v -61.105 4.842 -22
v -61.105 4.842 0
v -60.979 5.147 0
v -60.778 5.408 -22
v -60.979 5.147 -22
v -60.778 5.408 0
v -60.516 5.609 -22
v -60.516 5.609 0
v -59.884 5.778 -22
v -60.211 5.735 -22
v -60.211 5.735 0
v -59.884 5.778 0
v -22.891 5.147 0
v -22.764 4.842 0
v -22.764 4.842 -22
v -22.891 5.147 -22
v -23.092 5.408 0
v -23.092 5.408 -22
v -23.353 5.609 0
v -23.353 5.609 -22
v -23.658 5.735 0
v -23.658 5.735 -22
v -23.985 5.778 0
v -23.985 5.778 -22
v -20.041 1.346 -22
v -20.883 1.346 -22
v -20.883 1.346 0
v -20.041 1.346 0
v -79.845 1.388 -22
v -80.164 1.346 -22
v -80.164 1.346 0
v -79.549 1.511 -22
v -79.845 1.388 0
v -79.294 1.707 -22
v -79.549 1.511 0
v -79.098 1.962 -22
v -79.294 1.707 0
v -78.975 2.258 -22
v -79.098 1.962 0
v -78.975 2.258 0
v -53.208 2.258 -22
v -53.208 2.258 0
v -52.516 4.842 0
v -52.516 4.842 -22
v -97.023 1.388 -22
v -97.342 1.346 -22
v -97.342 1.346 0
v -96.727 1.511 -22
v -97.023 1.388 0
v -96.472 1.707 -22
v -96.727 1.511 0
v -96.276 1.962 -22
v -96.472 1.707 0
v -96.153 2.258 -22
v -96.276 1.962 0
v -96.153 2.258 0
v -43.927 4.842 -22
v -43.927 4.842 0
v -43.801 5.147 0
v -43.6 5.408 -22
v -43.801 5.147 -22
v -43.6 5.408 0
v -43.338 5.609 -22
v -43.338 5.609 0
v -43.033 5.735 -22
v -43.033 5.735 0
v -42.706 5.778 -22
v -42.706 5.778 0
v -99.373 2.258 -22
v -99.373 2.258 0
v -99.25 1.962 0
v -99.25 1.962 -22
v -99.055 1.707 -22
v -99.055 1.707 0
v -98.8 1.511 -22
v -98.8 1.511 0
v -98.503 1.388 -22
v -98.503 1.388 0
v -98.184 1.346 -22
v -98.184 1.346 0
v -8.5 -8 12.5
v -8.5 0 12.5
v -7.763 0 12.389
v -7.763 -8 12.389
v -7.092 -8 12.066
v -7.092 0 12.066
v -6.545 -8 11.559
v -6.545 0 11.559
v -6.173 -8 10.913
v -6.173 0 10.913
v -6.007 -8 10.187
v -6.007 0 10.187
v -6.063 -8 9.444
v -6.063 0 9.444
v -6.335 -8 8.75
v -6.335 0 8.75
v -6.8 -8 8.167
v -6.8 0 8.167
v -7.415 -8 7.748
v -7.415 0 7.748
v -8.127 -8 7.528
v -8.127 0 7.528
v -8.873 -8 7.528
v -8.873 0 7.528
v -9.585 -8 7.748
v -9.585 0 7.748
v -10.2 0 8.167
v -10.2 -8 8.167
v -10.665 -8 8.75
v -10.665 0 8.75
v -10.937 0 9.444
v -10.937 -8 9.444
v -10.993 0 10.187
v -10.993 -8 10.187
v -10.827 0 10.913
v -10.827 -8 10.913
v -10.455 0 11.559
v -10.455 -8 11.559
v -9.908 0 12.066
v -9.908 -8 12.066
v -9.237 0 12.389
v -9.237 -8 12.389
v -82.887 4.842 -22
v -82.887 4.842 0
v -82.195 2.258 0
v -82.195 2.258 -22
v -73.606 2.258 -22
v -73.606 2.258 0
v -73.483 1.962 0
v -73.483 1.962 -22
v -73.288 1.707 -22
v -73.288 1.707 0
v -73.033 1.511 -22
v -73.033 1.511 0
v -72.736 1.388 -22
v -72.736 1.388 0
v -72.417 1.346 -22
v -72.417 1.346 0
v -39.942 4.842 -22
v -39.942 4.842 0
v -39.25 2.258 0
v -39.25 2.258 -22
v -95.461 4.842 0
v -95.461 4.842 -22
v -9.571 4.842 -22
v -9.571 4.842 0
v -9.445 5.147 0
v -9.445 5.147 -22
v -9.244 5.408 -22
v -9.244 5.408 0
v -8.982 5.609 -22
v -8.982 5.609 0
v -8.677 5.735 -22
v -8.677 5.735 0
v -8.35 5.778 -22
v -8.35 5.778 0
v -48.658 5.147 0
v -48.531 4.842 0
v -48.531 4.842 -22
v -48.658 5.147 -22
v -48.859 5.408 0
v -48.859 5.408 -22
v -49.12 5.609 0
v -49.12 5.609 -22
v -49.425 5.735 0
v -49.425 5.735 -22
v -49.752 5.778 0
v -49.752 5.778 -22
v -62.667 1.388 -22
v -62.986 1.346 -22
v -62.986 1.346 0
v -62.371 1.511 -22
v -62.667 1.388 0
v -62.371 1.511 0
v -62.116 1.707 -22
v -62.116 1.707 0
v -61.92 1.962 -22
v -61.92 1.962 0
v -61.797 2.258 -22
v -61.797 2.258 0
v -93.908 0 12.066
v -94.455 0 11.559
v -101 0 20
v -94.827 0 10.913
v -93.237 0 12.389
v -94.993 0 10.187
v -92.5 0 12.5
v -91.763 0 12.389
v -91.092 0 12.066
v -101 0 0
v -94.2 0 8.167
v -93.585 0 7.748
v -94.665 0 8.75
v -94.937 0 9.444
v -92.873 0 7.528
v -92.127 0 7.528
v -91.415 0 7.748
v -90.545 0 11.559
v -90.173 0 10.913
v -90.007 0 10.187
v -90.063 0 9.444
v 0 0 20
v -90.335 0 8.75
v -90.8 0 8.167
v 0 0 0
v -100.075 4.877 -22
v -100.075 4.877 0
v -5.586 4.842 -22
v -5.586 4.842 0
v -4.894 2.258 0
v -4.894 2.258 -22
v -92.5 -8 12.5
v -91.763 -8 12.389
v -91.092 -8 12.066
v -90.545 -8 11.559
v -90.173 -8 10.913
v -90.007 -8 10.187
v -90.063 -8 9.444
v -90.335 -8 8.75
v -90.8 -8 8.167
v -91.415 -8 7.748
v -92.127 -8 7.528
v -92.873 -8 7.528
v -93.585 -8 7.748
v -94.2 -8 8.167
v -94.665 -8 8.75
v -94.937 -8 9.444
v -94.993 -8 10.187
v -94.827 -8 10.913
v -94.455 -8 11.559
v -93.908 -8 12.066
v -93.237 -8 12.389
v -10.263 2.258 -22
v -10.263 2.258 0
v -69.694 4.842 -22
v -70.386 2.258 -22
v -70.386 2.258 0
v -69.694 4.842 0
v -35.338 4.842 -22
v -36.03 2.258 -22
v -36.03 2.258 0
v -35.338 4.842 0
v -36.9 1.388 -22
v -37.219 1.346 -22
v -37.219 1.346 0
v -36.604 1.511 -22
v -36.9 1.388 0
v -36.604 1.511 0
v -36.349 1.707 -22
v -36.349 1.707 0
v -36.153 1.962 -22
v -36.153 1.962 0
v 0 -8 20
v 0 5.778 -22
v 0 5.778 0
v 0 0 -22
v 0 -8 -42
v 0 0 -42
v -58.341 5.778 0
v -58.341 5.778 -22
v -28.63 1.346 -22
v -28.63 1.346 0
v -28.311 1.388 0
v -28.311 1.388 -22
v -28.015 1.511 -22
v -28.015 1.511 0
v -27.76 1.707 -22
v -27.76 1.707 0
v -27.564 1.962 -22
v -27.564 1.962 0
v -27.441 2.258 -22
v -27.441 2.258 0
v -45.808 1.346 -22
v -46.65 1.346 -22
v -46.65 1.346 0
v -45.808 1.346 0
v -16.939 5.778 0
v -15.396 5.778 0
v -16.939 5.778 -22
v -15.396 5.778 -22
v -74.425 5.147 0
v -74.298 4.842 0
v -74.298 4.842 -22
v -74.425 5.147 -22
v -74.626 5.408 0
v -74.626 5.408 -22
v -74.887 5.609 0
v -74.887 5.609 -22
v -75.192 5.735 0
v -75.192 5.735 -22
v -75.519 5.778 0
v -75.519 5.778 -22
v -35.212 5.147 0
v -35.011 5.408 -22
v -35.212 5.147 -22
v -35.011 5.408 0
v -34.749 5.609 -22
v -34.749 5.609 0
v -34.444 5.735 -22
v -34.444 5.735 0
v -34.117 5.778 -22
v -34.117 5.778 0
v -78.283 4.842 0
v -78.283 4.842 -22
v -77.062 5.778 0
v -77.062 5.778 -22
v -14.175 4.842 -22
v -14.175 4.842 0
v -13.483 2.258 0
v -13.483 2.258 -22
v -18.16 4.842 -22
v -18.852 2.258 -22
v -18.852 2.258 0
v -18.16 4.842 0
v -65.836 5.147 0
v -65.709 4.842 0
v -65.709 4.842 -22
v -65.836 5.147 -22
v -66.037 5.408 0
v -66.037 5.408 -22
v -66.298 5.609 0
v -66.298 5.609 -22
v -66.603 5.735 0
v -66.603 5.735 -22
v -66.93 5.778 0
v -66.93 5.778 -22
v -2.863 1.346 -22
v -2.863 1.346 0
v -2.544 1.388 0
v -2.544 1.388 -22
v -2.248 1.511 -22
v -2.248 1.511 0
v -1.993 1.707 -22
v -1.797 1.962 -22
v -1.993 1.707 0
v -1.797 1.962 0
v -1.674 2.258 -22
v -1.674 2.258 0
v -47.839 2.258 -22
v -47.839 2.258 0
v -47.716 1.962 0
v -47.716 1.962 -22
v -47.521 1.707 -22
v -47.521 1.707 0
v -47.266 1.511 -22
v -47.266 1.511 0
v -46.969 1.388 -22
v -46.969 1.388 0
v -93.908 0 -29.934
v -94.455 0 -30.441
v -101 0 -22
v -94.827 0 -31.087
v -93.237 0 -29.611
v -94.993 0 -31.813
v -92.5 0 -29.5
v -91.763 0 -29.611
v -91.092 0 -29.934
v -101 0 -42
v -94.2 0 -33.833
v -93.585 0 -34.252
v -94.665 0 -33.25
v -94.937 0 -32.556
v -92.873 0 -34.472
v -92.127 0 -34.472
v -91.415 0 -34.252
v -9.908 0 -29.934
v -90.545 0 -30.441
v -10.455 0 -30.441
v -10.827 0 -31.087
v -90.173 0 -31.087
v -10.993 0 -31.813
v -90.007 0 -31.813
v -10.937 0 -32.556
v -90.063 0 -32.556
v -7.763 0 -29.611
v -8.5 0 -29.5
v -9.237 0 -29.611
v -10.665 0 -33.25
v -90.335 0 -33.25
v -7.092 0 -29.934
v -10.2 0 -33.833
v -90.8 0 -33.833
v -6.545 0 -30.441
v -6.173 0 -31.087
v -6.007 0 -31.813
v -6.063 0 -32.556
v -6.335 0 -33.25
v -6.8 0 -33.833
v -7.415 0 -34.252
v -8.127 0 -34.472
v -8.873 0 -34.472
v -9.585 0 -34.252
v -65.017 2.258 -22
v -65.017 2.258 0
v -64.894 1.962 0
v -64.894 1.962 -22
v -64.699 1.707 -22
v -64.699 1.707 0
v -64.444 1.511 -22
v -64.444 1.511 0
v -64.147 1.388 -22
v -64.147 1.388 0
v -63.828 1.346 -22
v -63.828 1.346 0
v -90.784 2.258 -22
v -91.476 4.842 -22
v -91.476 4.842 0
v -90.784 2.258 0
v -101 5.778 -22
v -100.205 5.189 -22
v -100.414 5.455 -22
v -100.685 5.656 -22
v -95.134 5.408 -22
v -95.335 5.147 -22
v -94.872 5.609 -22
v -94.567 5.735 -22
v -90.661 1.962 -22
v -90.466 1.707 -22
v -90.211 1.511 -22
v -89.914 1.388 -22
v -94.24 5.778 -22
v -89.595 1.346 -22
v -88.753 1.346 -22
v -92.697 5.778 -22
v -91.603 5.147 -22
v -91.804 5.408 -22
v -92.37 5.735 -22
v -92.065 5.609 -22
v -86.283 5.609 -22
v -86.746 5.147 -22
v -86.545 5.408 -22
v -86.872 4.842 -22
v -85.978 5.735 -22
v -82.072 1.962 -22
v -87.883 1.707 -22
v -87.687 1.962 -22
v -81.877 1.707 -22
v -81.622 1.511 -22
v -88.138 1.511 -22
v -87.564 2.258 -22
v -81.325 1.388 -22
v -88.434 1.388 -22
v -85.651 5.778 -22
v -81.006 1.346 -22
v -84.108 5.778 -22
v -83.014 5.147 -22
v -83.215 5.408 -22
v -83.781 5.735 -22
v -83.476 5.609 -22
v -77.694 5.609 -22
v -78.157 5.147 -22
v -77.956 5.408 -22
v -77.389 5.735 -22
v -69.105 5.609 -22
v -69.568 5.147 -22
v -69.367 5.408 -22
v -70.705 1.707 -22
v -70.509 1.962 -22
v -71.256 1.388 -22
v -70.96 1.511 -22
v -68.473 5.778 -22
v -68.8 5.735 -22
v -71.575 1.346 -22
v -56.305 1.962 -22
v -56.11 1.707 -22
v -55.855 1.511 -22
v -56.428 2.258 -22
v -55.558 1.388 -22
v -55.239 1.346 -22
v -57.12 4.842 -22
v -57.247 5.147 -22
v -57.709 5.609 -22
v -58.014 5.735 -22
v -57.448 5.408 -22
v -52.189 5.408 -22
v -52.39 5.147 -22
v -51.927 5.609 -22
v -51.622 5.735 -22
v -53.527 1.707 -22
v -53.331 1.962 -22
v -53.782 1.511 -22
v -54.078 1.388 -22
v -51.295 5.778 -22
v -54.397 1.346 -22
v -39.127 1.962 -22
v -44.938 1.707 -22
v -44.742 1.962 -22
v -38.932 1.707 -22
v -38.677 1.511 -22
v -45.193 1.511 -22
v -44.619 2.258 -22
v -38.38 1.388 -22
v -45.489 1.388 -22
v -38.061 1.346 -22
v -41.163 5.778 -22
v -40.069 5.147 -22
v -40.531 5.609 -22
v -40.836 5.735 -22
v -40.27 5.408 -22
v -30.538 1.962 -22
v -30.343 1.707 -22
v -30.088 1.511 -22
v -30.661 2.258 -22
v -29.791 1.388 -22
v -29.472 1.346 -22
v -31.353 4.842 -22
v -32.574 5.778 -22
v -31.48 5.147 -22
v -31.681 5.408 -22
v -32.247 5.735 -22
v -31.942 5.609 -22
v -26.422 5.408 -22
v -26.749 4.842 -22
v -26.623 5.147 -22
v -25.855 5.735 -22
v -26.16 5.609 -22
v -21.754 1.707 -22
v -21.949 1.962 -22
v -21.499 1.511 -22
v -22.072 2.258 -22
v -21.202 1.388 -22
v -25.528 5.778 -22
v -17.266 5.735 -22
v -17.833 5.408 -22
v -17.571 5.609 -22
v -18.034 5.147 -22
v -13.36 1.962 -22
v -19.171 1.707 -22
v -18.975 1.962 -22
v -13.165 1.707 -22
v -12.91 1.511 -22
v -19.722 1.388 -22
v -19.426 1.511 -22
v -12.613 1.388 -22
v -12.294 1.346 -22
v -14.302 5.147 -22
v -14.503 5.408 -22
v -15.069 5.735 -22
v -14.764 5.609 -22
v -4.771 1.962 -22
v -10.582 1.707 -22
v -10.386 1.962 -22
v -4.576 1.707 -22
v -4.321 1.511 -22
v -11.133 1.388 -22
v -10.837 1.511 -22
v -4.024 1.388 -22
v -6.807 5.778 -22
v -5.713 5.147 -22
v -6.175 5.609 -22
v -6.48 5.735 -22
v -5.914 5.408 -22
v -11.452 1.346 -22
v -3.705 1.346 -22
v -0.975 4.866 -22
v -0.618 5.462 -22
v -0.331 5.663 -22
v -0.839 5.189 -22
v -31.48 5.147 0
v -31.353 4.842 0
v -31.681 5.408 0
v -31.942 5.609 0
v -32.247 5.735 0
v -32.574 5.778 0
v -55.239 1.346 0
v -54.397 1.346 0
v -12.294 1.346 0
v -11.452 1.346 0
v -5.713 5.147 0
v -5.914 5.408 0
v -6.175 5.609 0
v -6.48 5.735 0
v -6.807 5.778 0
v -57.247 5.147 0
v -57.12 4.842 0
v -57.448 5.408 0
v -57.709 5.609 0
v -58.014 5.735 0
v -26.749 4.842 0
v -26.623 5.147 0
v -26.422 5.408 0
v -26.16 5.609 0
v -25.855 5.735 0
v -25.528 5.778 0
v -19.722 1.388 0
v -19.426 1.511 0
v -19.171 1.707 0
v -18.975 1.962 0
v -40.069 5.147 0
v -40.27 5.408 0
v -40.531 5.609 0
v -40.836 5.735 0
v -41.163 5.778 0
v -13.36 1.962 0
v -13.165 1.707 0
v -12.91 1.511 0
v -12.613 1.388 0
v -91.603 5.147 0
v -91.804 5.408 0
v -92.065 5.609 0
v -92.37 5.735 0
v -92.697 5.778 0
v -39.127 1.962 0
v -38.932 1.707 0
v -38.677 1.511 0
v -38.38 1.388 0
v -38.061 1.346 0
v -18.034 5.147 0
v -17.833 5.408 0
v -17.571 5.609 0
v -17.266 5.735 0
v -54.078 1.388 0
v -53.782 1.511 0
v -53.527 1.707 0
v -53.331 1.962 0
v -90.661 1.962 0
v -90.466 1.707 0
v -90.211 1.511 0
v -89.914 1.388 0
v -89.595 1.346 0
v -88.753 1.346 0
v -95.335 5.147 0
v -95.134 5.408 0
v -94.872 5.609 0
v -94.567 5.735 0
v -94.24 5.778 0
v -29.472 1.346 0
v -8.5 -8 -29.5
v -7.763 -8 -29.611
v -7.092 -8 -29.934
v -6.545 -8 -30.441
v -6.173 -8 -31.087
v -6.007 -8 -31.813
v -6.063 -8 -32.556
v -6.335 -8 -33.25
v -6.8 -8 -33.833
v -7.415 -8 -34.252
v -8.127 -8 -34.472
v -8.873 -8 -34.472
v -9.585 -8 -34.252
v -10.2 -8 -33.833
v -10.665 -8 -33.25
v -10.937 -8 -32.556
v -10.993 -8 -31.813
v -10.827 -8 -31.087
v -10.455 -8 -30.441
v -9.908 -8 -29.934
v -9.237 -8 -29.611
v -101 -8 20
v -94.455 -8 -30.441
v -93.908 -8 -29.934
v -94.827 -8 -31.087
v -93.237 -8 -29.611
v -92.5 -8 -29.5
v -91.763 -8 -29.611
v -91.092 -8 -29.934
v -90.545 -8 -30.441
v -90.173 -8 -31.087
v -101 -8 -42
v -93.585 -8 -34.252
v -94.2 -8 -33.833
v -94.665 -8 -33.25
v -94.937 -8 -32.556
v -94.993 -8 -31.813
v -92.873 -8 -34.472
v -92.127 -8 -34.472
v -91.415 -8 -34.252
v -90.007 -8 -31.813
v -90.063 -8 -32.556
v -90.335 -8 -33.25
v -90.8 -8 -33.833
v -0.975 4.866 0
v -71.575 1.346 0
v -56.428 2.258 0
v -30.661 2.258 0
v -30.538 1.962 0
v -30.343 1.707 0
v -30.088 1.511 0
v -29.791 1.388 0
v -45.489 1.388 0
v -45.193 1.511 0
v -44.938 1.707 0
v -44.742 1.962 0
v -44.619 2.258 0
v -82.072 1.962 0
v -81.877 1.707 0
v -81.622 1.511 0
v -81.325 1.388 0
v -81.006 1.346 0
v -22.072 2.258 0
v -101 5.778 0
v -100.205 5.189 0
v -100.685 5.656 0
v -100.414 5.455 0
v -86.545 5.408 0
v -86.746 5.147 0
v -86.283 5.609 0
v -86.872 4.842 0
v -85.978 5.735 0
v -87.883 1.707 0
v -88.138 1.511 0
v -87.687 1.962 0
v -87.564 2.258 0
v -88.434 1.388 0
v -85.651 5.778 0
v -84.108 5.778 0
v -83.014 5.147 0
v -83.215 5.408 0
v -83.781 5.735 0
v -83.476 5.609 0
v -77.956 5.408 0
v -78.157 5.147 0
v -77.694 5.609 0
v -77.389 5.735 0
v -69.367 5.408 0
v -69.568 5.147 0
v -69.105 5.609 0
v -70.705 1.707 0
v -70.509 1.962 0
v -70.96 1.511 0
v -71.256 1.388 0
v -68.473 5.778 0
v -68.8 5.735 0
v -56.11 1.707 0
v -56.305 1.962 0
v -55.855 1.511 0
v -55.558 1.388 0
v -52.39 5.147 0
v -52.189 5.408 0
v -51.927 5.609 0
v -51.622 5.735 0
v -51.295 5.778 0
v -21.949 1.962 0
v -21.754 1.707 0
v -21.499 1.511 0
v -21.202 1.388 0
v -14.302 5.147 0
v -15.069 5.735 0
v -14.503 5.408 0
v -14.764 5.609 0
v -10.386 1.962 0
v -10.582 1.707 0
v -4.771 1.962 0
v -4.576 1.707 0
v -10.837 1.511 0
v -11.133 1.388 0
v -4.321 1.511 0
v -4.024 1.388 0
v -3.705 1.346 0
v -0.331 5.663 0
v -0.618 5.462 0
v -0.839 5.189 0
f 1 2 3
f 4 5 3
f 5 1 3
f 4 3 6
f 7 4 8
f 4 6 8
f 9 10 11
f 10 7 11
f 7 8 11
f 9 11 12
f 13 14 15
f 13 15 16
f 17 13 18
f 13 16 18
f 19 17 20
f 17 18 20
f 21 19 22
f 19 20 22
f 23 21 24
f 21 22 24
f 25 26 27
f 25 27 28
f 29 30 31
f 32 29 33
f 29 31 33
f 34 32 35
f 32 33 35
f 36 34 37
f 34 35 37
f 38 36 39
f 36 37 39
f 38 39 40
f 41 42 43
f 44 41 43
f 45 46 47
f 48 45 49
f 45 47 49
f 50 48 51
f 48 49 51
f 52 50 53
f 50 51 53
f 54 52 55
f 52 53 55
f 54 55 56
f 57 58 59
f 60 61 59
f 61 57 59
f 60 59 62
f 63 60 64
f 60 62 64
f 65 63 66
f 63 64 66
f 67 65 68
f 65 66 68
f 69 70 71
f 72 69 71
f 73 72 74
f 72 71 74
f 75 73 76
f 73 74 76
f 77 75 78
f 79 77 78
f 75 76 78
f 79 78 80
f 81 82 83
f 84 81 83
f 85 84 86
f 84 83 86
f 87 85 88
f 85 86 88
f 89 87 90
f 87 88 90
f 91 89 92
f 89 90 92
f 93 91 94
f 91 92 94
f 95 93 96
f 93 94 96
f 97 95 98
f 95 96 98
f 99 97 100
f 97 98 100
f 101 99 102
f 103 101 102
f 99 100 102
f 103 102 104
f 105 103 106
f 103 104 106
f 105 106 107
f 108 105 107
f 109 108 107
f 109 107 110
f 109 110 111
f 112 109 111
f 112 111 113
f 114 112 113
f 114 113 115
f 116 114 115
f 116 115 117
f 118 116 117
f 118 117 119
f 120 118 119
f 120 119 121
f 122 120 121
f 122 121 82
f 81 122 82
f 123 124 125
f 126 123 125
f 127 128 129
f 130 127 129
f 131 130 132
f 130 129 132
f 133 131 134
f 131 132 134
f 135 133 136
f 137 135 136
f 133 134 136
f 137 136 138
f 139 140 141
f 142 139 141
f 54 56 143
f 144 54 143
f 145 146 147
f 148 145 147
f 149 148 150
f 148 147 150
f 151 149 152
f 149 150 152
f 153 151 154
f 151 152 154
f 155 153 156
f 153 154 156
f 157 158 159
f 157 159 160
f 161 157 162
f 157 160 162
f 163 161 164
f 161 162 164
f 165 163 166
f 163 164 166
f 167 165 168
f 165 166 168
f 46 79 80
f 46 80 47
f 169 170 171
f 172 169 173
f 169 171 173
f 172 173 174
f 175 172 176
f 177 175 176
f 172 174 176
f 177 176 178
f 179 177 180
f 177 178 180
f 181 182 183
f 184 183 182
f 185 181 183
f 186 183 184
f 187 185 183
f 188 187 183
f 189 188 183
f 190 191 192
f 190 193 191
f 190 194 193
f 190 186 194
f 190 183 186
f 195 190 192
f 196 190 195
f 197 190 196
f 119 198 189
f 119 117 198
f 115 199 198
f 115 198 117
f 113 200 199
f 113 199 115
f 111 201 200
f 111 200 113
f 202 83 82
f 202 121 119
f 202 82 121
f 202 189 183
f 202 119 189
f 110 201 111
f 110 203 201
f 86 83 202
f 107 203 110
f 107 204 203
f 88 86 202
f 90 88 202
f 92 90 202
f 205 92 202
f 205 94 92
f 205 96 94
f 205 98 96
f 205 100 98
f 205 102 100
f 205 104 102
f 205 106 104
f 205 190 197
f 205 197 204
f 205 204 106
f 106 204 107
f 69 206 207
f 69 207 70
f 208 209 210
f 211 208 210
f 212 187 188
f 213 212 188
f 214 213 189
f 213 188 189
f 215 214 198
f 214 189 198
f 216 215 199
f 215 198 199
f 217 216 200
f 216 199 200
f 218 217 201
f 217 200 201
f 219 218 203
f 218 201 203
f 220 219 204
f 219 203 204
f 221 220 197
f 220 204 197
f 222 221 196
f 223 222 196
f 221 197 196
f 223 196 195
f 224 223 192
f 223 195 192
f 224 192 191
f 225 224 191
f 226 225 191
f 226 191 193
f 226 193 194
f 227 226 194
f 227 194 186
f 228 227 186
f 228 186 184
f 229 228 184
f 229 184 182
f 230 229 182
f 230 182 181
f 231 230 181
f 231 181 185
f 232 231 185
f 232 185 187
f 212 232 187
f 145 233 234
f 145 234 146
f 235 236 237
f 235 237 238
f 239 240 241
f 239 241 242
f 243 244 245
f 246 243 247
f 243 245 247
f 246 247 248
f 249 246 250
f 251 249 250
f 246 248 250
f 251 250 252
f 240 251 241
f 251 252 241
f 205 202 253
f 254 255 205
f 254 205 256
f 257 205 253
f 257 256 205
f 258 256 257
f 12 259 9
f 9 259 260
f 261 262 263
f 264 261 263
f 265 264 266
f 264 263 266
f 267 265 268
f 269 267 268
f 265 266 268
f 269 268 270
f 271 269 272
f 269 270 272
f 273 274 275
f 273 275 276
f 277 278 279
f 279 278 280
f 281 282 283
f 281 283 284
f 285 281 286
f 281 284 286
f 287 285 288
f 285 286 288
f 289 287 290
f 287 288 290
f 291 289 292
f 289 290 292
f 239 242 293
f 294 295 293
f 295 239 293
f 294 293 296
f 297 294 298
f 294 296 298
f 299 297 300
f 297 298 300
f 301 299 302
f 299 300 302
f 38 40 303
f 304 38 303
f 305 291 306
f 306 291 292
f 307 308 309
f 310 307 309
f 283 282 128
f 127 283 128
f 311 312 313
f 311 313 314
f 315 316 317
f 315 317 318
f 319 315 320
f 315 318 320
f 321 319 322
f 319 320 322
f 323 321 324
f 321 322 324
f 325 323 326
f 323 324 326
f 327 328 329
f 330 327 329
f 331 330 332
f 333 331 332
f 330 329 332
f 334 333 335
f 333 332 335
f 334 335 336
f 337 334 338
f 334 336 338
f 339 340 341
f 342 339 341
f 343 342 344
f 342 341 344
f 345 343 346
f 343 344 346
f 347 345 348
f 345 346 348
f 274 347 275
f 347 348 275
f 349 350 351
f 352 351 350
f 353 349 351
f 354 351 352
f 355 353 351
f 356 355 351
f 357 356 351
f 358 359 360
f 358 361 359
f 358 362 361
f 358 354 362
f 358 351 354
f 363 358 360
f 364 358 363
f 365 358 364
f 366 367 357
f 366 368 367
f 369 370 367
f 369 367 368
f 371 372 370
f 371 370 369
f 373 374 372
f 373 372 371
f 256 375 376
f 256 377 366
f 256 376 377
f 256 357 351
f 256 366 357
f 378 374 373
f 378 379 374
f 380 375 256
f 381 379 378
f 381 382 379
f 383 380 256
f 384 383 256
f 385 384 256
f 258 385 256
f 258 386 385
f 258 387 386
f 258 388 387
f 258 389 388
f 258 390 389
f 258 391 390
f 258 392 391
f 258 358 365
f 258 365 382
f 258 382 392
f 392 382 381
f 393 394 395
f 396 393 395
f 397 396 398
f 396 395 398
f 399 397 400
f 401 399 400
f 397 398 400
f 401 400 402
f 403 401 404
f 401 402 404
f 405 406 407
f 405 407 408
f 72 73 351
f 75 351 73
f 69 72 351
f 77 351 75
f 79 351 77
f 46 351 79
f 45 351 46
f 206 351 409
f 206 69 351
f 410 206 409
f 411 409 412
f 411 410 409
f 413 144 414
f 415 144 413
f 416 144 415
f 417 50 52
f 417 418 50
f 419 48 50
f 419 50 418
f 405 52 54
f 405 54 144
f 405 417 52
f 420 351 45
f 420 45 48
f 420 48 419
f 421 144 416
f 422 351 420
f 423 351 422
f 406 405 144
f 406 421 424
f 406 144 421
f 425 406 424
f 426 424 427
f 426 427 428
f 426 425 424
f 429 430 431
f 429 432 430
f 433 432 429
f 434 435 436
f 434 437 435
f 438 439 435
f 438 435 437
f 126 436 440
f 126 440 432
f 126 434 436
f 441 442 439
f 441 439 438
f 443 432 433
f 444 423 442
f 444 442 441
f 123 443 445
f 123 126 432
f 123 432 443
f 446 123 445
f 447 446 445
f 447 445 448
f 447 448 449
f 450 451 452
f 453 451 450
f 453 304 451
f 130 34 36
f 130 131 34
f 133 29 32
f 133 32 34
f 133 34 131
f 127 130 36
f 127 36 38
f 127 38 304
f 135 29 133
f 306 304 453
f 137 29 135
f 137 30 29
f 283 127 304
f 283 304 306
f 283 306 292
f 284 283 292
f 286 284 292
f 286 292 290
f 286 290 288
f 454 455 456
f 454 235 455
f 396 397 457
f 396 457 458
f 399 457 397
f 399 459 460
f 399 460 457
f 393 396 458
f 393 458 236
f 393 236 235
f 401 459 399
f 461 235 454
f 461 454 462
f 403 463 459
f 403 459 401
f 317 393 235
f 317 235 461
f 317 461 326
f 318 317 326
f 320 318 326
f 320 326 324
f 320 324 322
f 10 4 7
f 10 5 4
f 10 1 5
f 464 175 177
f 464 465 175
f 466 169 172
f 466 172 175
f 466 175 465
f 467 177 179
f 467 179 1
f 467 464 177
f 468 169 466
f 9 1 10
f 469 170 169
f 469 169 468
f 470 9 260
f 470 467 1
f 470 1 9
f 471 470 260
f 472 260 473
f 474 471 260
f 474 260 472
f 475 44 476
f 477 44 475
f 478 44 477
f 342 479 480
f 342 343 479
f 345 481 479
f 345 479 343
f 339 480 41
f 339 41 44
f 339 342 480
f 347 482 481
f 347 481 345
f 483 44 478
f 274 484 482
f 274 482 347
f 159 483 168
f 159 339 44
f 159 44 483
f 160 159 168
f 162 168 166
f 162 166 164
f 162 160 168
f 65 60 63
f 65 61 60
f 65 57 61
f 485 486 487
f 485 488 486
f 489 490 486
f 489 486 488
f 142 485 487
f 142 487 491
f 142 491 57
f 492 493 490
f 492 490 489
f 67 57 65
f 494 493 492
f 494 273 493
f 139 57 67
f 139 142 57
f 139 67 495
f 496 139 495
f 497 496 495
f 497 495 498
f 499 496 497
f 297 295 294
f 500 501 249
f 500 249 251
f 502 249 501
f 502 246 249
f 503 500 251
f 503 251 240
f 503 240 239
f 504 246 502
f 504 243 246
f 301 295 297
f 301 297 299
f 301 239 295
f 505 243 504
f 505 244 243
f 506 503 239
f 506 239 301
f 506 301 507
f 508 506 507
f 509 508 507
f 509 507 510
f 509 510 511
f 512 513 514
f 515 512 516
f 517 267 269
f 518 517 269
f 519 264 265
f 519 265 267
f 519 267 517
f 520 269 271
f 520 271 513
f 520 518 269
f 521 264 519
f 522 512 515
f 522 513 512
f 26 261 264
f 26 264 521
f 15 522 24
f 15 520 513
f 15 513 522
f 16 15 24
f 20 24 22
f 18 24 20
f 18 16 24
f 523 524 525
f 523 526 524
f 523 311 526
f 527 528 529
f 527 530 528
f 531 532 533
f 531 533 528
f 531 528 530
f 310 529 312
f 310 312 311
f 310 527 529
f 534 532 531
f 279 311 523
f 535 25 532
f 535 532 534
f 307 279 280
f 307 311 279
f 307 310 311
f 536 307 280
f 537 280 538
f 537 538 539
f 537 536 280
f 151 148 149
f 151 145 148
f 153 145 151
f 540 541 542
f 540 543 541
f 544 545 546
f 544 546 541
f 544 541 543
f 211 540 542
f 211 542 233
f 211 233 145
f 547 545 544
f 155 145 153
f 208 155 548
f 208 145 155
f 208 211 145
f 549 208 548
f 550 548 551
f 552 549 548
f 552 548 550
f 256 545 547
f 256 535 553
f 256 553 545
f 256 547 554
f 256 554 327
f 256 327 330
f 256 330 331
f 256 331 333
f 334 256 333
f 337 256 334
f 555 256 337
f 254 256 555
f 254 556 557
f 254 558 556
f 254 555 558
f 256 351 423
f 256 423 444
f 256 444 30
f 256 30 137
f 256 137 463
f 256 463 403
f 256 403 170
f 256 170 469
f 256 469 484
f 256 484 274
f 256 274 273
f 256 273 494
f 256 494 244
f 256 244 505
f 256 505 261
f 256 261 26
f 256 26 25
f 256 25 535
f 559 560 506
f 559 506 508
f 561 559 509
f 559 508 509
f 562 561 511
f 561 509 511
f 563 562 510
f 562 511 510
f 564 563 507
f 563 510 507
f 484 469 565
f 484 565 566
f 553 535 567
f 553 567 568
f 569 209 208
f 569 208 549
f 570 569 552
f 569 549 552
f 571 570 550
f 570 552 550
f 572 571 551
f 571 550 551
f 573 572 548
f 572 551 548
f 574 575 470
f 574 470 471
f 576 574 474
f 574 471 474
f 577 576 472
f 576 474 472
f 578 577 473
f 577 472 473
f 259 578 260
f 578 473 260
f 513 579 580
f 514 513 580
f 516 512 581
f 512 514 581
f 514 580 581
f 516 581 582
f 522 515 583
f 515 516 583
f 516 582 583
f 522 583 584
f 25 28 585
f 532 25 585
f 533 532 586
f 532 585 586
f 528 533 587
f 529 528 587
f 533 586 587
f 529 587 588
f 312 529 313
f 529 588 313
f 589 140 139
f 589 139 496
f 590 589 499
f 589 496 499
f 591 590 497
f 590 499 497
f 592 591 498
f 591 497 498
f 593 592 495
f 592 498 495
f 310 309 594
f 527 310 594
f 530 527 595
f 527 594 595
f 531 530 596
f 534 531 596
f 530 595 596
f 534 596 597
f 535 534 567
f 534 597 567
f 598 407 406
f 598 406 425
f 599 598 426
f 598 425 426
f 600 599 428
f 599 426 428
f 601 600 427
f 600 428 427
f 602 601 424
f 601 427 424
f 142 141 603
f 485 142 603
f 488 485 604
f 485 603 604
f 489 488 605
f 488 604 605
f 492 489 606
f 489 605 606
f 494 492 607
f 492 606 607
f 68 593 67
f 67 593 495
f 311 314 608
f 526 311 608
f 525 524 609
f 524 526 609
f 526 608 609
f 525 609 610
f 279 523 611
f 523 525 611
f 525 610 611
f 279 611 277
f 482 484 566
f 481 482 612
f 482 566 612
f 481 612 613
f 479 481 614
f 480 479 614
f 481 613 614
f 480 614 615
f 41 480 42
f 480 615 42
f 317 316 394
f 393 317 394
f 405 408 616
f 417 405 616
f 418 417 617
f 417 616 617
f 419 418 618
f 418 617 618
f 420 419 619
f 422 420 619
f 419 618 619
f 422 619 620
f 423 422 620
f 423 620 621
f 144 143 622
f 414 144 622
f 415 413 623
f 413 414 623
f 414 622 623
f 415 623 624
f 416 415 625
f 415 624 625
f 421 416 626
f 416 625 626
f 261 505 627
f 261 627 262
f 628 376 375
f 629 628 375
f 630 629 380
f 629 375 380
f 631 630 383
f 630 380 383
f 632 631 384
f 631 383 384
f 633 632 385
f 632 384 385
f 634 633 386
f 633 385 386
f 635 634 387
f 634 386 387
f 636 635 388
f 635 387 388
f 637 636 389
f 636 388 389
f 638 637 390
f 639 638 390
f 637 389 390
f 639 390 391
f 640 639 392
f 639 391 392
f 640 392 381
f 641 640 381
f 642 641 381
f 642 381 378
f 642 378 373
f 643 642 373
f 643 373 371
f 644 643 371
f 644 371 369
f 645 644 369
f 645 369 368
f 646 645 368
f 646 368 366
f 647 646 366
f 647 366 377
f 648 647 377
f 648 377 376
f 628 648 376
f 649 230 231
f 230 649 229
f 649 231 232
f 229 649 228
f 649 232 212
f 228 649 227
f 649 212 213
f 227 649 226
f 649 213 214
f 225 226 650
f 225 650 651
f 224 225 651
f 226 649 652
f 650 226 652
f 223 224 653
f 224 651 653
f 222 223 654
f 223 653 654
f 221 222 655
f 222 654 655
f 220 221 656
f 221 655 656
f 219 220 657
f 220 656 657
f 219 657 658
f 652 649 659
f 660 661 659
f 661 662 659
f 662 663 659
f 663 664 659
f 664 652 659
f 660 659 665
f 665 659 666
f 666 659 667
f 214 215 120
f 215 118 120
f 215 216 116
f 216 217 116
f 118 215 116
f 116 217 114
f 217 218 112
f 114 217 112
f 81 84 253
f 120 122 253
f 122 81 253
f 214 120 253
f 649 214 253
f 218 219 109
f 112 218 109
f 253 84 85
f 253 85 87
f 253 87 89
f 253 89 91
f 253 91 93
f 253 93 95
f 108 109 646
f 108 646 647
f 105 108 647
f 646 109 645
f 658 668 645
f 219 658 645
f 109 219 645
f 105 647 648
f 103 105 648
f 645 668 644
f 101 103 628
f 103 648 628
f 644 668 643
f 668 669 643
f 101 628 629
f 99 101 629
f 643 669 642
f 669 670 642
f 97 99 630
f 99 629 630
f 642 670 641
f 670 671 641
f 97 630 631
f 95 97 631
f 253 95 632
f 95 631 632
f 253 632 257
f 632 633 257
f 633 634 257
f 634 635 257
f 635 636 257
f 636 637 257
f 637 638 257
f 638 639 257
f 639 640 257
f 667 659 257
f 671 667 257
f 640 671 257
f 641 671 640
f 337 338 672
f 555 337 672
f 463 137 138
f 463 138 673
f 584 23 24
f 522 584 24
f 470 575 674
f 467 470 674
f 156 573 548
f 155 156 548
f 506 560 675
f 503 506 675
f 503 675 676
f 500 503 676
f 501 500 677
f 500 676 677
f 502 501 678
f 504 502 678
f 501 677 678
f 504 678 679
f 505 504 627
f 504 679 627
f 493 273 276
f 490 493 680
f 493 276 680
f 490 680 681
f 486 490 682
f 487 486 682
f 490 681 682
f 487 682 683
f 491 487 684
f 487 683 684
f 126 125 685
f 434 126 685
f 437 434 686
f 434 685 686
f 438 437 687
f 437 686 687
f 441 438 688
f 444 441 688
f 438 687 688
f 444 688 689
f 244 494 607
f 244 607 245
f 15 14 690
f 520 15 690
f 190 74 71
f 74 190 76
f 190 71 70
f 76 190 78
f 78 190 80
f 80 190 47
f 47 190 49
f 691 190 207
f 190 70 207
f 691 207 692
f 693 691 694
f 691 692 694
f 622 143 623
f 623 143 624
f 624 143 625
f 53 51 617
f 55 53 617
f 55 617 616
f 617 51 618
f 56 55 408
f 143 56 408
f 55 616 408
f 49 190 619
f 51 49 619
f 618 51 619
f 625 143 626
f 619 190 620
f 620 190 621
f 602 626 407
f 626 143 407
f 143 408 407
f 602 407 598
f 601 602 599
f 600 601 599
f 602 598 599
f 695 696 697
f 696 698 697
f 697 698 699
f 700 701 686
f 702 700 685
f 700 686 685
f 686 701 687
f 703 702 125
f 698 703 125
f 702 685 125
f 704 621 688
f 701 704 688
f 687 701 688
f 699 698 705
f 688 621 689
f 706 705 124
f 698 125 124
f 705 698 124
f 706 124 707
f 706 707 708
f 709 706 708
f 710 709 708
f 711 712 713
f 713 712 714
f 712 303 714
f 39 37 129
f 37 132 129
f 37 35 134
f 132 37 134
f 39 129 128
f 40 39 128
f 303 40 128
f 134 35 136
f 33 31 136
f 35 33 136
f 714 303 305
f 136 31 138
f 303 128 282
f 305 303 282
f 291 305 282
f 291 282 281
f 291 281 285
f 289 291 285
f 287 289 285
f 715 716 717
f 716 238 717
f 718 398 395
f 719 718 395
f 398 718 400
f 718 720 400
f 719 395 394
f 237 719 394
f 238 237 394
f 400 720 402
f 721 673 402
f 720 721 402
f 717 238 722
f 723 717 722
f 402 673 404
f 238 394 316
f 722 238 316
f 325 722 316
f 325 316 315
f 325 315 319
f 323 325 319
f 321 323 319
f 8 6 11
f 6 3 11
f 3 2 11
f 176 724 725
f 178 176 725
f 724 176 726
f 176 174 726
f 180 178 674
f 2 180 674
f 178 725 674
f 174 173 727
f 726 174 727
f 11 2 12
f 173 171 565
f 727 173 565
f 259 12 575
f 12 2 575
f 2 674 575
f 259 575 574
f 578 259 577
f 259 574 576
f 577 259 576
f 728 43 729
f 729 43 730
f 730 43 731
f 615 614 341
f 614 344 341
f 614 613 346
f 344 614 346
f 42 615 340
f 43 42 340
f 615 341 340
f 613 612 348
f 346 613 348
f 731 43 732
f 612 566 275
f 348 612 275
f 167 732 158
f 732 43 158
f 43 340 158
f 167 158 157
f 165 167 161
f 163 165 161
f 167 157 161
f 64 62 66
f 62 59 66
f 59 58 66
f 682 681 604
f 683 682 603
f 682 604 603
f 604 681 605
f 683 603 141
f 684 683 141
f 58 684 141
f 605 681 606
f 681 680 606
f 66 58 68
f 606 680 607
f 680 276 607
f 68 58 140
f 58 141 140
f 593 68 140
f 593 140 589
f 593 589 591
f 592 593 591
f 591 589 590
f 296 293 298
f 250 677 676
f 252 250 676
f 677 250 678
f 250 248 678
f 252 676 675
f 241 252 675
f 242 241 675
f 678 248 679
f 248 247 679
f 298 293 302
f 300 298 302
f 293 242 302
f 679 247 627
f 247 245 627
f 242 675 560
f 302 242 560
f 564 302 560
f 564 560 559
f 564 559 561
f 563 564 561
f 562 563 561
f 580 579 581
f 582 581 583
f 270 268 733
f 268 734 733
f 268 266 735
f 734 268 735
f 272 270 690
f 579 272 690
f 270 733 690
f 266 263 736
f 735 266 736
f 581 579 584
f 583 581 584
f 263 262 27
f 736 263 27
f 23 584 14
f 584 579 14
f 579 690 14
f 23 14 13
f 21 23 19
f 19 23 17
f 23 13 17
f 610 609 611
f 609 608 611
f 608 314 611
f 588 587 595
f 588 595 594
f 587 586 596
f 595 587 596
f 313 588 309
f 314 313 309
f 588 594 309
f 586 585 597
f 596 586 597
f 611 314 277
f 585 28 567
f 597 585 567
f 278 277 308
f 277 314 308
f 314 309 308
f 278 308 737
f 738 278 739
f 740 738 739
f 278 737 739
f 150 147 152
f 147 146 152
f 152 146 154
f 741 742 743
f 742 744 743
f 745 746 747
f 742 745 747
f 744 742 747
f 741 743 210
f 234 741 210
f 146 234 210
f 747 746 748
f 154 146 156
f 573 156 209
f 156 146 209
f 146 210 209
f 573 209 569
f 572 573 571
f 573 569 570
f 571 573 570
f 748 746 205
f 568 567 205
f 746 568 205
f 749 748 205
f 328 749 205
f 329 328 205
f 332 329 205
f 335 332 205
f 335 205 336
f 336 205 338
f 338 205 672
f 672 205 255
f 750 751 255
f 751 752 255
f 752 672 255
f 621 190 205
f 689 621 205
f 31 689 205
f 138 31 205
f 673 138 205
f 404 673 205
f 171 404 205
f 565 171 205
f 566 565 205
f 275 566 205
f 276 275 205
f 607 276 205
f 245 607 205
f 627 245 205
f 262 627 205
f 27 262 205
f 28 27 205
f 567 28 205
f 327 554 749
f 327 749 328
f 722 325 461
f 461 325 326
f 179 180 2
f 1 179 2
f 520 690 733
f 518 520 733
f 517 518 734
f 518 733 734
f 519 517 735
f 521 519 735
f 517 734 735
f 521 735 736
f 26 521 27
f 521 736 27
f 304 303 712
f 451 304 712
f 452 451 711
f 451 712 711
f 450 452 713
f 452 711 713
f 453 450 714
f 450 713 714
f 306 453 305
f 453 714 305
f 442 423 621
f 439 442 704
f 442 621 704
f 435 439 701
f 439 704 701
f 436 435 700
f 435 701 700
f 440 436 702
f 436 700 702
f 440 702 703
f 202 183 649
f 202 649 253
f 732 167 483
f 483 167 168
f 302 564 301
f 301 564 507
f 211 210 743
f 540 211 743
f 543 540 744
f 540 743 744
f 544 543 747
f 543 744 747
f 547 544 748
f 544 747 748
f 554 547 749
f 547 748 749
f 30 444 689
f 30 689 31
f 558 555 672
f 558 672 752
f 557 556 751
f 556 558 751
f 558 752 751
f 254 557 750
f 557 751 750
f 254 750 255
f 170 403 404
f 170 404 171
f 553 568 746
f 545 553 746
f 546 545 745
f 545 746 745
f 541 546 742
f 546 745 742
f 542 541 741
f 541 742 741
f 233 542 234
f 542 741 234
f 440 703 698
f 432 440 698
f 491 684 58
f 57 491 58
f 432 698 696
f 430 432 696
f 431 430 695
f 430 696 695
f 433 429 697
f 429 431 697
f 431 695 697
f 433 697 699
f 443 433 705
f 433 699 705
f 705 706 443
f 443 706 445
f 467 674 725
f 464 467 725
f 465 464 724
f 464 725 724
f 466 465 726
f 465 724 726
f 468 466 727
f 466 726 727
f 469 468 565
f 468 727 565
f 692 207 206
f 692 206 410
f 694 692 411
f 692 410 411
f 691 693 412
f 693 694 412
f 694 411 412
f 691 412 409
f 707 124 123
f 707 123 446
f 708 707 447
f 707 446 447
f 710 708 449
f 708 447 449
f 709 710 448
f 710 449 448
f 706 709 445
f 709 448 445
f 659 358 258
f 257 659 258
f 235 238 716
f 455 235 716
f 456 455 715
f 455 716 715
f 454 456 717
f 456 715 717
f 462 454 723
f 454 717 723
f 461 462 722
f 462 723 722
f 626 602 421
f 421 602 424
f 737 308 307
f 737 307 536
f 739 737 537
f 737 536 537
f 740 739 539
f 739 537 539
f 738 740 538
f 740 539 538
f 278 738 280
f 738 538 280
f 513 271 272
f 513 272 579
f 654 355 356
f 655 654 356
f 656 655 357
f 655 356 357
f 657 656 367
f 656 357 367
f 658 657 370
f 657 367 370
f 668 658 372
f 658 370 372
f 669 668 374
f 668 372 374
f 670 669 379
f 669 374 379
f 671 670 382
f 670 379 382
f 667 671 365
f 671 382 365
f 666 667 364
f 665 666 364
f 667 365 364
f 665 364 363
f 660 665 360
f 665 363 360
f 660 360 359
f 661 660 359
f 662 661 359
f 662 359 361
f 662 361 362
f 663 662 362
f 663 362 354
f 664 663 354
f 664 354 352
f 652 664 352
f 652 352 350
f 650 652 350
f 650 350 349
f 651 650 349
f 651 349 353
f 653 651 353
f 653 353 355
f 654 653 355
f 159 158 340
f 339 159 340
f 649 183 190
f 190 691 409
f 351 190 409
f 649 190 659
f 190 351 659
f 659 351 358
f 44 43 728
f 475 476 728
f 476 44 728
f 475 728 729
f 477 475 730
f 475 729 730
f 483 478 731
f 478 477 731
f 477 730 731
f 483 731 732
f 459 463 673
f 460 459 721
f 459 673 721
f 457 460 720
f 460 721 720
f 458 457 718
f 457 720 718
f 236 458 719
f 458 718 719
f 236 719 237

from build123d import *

# Parameters (mm, degrees)
SKETCH3_W           = 22
SKETCH3_H           = 5.7785
BOSS_EXTRUDE2_DEPTH = 101
CUT_EXTRUDE1_DEPTH  = 104.529662717
FILLET1_R           = 1.2637
SKETCH10_W          = 101
SKETCH10_H          = 62
BOSS_EXTRUDE6_DEPTH = 8
SKETCH11_R          = 2.5
CUT_EXTRUDE2_DEPTH  = 110.676797911
SKETCH12_R          = 2.5
CUT_EXTRUDE3_DEPTH  = 110.676797911


with BuildPart() as part:
    # Sketch3 → Boss-Extrude2 (new body)
    with BuildSketch(Plane(origin=(0, 0, 0), x_dir=(0, 0, -1), z_dir=(1, 0, 0))):
        with Locations((11, 2.88925)):
            Rectangle(SKETCH3_W, SKETCH3_H)
    extrude(amount=-BOSS_EXTRUDE2_DEPTH)

    # Sketch5 → Cut-Extrude1 (cut, through all)
    with BuildSketch(Plane(origin=(0, 0, 0), x_dir=(-1, 0, 0), z_dir=(0, 0, -1))):
        with BuildLine():
            Line((1.674138493, 2.258445519), (0.421264214, 6.934235985))
            Line((0.421264214, 6.934235985), (6.147128546, 6.934235985))
            Line((6.147128546, 6.934235985), (4.894261507, 2.258445519))
            ThreePointArc((4.894261507, 2.258445519), (4.454663567, 1.600540709), (3.7054, 1.3462))
            Line((3.7054, 1.3462), (2.863, 1.3462))
            ThreePointArc((2.863, 1.3462), (2.113736433, 1.600540709), (1.674138493, 2.258445519))
        make_face()
        with BuildLine():
            Line((10.263138493, 2.258445519), (9.010264214, 6.934235985))
            Line((9.010264214, 6.934235985), (14.736128546, 6.934235985))
            Line((14.736128546, 6.934235985), (13.483261507, 2.258445519))
            ThreePointArc((13.483261507, 2.258445519), (13.043663567, 1.600540709), (12.2944, 1.3462))
            Line((12.2944, 1.3462), (11.452, 1.3462))
            ThreePointArc((11.452, 1.3462), (10.702736433, 1.600540709), (10.263138493, 2.258445519))
        make_face()
        with BuildLine():
            Line((18.852138493, 2.258445519), (17.599264214, 6.934235985))
            Line((17.599264214, 6.934235985), (23.325128546, 6.934235985))
            Line((23.325128546, 6.934235985), (22.072261507, 2.258445519))
            ThreePointArc((22.072261507, 2.258445519), (21.632663567, 1.600540709), (20.8834, 1.3462))
            Line((20.8834, 1.3462), (20.041, 1.3462))
            ThreePointArc((20.041, 1.3462), (19.291736433, 1.600540709), (18.852138493, 2.258445519))
        make_face()
        with BuildLine():
            Line((27.441138493, 2.258445519), (26.188264214, 6.934235985))
            Line((26.188264214, 6.934235985), (31.914128546, 6.934235985))
            Line((31.914128546, 6.934235985), (30.661261507, 2.258445519))
            ThreePointArc((30.661261507, 2.258445519), (30.221663567, 1.600540709), (29.4724, 1.3462))
            Line((29.4724, 1.3462), (28.63, 1.3462))
            ThreePointArc((28.63, 1.3462), (27.880736433, 1.600540709), (27.441138493, 2.258445519))
        make_face()
        with BuildLine():
            Line((36.030138493, 2.258445519), (34.777264214, 6.934235985))
            Line((34.777264214, 6.934235985), (40.503128546, 6.934235985))
            Line((40.503128546, 6.934235985), (39.250261507, 2.258445519))
            ThreePointArc((39.250261507, 2.258445519), (38.810663567, 1.600540709), (38.0614, 1.3462))
            Line((38.0614, 1.3462), (37.219, 1.3462))
            ThreePointArc((37.219, 1.3462), (36.469736433, 1.600540709), (36.030138493, 2.258445519))
        make_face()
        with BuildLine():
            Line((44.619138493, 2.258445519), (43.366264214, 6.934235985))
            Line((43.366264214, 6.934235985), (49.092128546, 6.934235985))
            Line((49.092128546, 6.934235985), (47.839261507, 2.258445519))
            ThreePointArc((47.839261507, 2.258445519), (47.399663567, 1.600540709), (46.6504, 1.3462))
            Line((46.6504, 1.3462), (45.808, 1.3462))
            ThreePointArc((45.808, 1.3462), (45.058736433, 1.600540709), (44.619138493, 2.258445519))
        make_face()
        with BuildLine():
            Line((53.208138493, 2.258445519), (51.955264214, 6.934235985))
            Line((51.955264214, 6.934235985), (57.681128546, 6.934235985))
            Line((57.681128546, 6.934235985), (56.428261507, 2.258445519))
            ThreePointArc((56.428261507, 2.258445519), (55.988663567, 1.600540709), (55.2394, 1.3462))
            Line((55.2394, 1.3462), (54.397, 1.3462))
            ThreePointArc((54.397, 1.3462), (53.647736433, 1.600540709), (53.208138493, 2.258445519))
        make_face()
        with BuildLine():
            Line((61.797138493, 2.258445519), (60.544264214, 6.934235985))
            Line((60.544264214, 6.934235985), (66.270128546, 6.934235985))
            Line((66.270128546, 6.934235985), (65.017261507, 2.258445519))
            ThreePointArc((65.017261507, 2.258445519), (64.577663567, 1.600540709), (63.8284, 1.3462))
            Line((63.8284, 1.3462), (62.986, 1.3462))
            ThreePointArc((62.986, 1.3462), (62.236736433, 1.600540709), (61.797138493, 2.258445519))
        make_face()
        with BuildLine():
            Line((70.386138493, 2.258445519), (69.133264214, 6.934235985))
            Line((69.133264214, 6.934235985), (74.859128546, 6.934235985))
            Line((74.859128546, 6.934235985), (73.606261507, 2.258445519))
            ThreePointArc((73.606261507, 2.258445519), (73.166663567, 1.600540709), (72.4174, 1.3462))
            Line((72.4174, 1.3462), (71.575, 1.3462))
            ThreePointArc((71.575, 1.3462), (70.825736433, 1.600540709), (70.386138493, 2.258445519))
        make_face()
        with BuildLine():
            Line((78.975138493, 2.258445519), (77.722264214, 6.934235985))
            Line((77.722264214, 6.934235985), (83.448128546, 6.934235985))
            Line((83.448128546, 6.934235985), (82.195261507, 2.258445519))
            ThreePointArc((82.195261507, 2.258445519), (81.755663567, 1.600540709), (81.0064, 1.3462))
            Line((81.0064, 1.3462), (80.164, 1.3462))
            ThreePointArc((80.164, 1.3462), (79.414736433, 1.600540709), (78.975138493, 2.258445519))
        make_face()
        with BuildLine():
            Line((87.564138493, 2.258445519), (86.311264214, 6.934235985))
            Line((86.311264214, 6.934235985), (92.037128546, 6.934235985))
            Line((92.037128546, 6.934235985), (90.784261507, 2.258445519))
            ThreePointArc((90.784261507, 2.258445519), (90.344663567, 1.600540709), (89.5954, 1.3462))
            Line((89.5954, 1.3462), (88.753, 1.3462))
            ThreePointArc((88.753, 1.3462), (88.003736433, 1.600540709), (87.564138493, 2.258445519))
        make_face()
        with BuildLine():
            Line((96.153138493, 2.258445519), (94.900264214, 6.934235985))
            Line((94.900264214, 6.934235985), (100.626128546, 6.934235985))
            Line((100.626128546, 6.934235985), (99.373261507, 2.258445519))
            ThreePointArc((99.373261507, 2.258445519), (98.933663567, 1.600540709), (98.1844, 1.3462))
            Line((98.1844, 1.3462), (97.342, 1.3462))
            ThreePointArc((97.342, 1.3462), (96.592736433, 1.600540709), (96.153138493, 2.258445519))
        make_face()
    extrude(amount=CUT_EXTRUDE1_DEPTH, mode=Mode.SUBTRACT)

    # Fillet1
    # the kernel refuses this fillet: 1.2637 mm, written as the material it takes off along each edge
    with BuildSketch(Plane(origin=(-14.426451812, 5.7785, -24.424181413), x_dir=(-1, 0, 0), z_dir=(0, 0, 1)), Plane(origin=(-23.015451812, 5.7785, -24.424181413), x_dir=(-1, 0, 0), z_dir=(0, 0, 1)), Plane(origin=(-31.604451812, 5.7785, -24.424181413), x_dir=(-1, 0, 0), z_dir=(0, 0, 1)), Plane(origin=(-40.193451812, 5.7785, -24.424181413), x_dir=(-1, 0, 0), z_dir=(0, 0, 1)), Plane(origin=(-48.782451812, 5.7785, -24.424181413), x_dir=(-1, 0, 0), z_dir=(0, 0, 1)), Plane(origin=(-57.371451812, 5.7785, -24.424181413), x_dir=(-1, 0, 0), z_dir=(0, 0, 1)), Plane(origin=(-65.960451812, 5.7785, -24.424181413), x_dir=(-1, 0, 0), z_dir=(0, 0, 1)), Plane(origin=(-74.549451812, 5.7785, -24.424181413), x_dir=(-1, 0, 0), z_dir=(0, 0, 1)), Plane(origin=(-83.138451812, 5.7785, -24.424181413), x_dir=(-1, 0, 0), z_dir=(0, 0, 1)), Plane(origin=(-91.727451812, 5.7785, -24.424181413), x_dir=(-1, 0, 0), z_dir=(0, 0, 1)), Plane(origin=(-5.837451812, 5.7785, -24.424181413), x_dir=(-1, 0, 0), z_dir=(0, 0, 1))) as fillet1_piece_1:
        with BuildLine():
            CenterArc((FILLET1_R * 0.767328135667, FILLET1_R), FILLET1_R, 194.999917223, 75.000082777)
            Line((-FILLET1_R * 0.198598064545, FILLET1_R * 0.7411823504), (-FILLET1_R * 0.217916588549, FILLET1_R * 0.736005997408))
            Line((-FILLET1_R * 0.217916588549, FILLET1_R * 0.736005997408), (-FILLET1_R * 0.0153465627133, -FILLET1_R * 0.02))
            Line((-FILLET1_R * 0.0153465627133, -FILLET1_R * 0.02), (FILLET1_R * 0.767328135667, -FILLET1_R * 0.02))
            Line((FILLET1_R * 0.767328135667, -FILLET1_R * 0.02), (FILLET1_R * 0.767328135667, 0))
        make_face()
    extrude(amount=26.848362825, mode=Mode.SUBTRACT)
    with BuildSketch(Plane(origin=(-9.319942738, 5.7785, 2.424177787), x_dir=(-0.25881904510252474, -0.9659258262890672, 0), z_dir=(0, 0, -1)), Plane(origin=(-17.908942738, 5.7785, 2.424177787), x_dir=(-0.25881904510252474, -0.9659258262890672, 0), z_dir=(0, 0, -1)), Plane(origin=(-26.497942738, 5.7785, 2.424177787), x_dir=(-0.25881904510252496, -0.9659258262890672, 0), z_dir=(0, 0, -1)), Plane(origin=(-35.086942738, 5.7785, 2.424177787), x_dir=(-0.2588190451025256, -0.965925826289067, 0), z_dir=(0, 0, -1)), Plane(origin=(-43.675942738, 5.7785, 2.424177787), x_dir=(-0.2588190451025256, -0.965925826289067, 0), z_dir=(0, 0, -1)), Plane(origin=(-52.264942738, 5.7785, 2.424177787), x_dir=(-0.25881904510252424, -0.9659258262890673, 0), z_dir=(0, 0, -1)), Plane(origin=(-60.853942738, 5.7785, 2.424177787), x_dir=(-0.25881904510252424, -0.9659258262890673, 0), z_dir=(0, 0, -1)), Plane(origin=(-69.442942738, 5.7785, 2.424177787), x_dir=(-0.25881904510252607, -0.9659258262890669, 0), z_dir=(0, 0, -1)), Plane(origin=(-78.031942738, 5.7785, 2.424177787), x_dir=(-0.25881904510252607, -0.9659258262890669, 0), z_dir=(0, 0, -1)), Plane(origin=(-86.620942738, 5.7785, 2.424177787), x_dir=(-0.2588190451025252, -0.9659258262890671, 0), z_dir=(0, 0, -1)), Plane(origin=(-95.209942738, 5.7785, 2.424177787), x_dir=(-0.2588190451025268, -0.9659258262890666, 0), z_dir=(0, 0, -1))) as fillet1_piece_2:
        with BuildLine():
            CenterArc((FILLET1_R * 0.767326987979, -FILLET1_R), FILLET1_R, 90, 75)
            Line((-FILLET1_R * 0.19859883831, -FILLET1_R * 0.741180954897), (-FILLET1_R * 0.217917354836, -FILLET1_R * 0.736004573995))
            Line((-FILLET1_R * 0.217917354836, -FILLET1_R * 0.736004573995), (-FILLET1_R * 0.0153465397596, FILLET1_R * 0.02))
            Line((-FILLET1_R * 0.0153465397596, FILLET1_R * 0.02), (FILLET1_R * 0.767326987979, FILLET1_R * 0.02))
            Line((FILLET1_R * 0.767326987979, FILLET1_R * 0.02), (FILLET1_R * 0.767326987979, 0))
        make_face()
    extrude(amount=26.848355574, mode=Mode.SUBTRACT)
    with BuildSketch(Plane(origin=(-100.316451812, 5.7785, -24.33349599), x_dir=(-1, 0, 0), z_dir=(0, 0, 1))) as fillet1_piece_3:
        with BuildLine():
            CenterArc((0.97906096, 1.22866183), FILLET1_R, 194.999917223, 61.476400821)
            Line((-0.241579979, 0.901593966), (-0.265992798, 0.895052609))
            Line((-0.265992798, 0.895052609), (-0.024412819, -0.006541357))
            Line((-0.024412819, -0.006541357), (0, -0.025274))
            ThreePointArc((0, -0.025274), (0.341774094, -0.025274), (0.677637933, -0.024573237))
            Line((0.677637933, -0.024573237), (0.683548188, 0))
        make_face()
    extrude(amount=26.666991979, mode=Mode.SUBTRACT)
    with BuildSketch(Plane(origin=(-0.730942738, 5.7785, 2.362037613), x_dir=(-0.2588190451025249, -0.9659258262890672, 0), z_dir=(0, 0, -1))) as fillet1_piece_4:
        with BuildLine():
            CenterArc((0.944815045, -1.2637), FILLET1_R, 90, 63.813512011)
            Line((-0.189181901, -0.706036468), (-0.21186184, -0.694883197))
            ThreePointArc((-0.21186184, -0.694883197), (-0.11900376, -0.346476841), (-0.024412809, 0.006541393))
            Line((-0.024412809, 0.006541393), (0, 0.025274))
            Line((0, 0.025274), (0.944815045, 0.025274))
            Line((0.944815045, 0.025274), (0.944815045, 0))
        make_face()
    extrude(amount=26.724075226, mode=Mode.SUBTRACT)

    # Sketch10 → Boss-Extrude6 (add)
    with BuildSketch(Plane(origin=(0, 0, 0), x_dir=(1, 0, 0), z_dir=(0, 1, 0))):
        with Locations((-50.5, 11)):
            Rectangle(SKETCH10_W, SKETCH10_H)
    extrude(amount=-BOSS_EXTRUDE6_DEPTH)

    # Sketch11 → Cut-Extrude2 (cut, through all)
    with BuildSketch(Plane(origin=(0, 0, 0), x_dir=(1, 0, 0), z_dir=(0, 1, 0))):
        with Locations(Location((-8.5, -10, 0), (0, 0, 270))):
            Circle(SKETCH11_R)
        with Locations(Location((-92.5, -10, 0), (0, 0, 270))):
            Circle(SKETCH11_R)
    extrude(amount=-CUT_EXTRUDE2_DEPTH, mode=Mode.SUBTRACT)

    # Sketch12 → Cut-Extrude3 (cut, through all)
    with BuildSketch(Plane(origin=(0, 0, 0), x_dir=(1, 0, 0), z_dir=(0, 1, 0))):
        with Locations(Location((-8.5, 32, 0), (0, 0, 270))):
            Circle(SKETCH12_R)
        with Locations(Location((-92.5, 32, 0), (0, 0, 270))):
            Circle(SKETCH12_R)
    extrude(amount=-CUT_EXTRUDE3_DEPTH, mode=Mode.SUBTRACT)


solid = part.part
